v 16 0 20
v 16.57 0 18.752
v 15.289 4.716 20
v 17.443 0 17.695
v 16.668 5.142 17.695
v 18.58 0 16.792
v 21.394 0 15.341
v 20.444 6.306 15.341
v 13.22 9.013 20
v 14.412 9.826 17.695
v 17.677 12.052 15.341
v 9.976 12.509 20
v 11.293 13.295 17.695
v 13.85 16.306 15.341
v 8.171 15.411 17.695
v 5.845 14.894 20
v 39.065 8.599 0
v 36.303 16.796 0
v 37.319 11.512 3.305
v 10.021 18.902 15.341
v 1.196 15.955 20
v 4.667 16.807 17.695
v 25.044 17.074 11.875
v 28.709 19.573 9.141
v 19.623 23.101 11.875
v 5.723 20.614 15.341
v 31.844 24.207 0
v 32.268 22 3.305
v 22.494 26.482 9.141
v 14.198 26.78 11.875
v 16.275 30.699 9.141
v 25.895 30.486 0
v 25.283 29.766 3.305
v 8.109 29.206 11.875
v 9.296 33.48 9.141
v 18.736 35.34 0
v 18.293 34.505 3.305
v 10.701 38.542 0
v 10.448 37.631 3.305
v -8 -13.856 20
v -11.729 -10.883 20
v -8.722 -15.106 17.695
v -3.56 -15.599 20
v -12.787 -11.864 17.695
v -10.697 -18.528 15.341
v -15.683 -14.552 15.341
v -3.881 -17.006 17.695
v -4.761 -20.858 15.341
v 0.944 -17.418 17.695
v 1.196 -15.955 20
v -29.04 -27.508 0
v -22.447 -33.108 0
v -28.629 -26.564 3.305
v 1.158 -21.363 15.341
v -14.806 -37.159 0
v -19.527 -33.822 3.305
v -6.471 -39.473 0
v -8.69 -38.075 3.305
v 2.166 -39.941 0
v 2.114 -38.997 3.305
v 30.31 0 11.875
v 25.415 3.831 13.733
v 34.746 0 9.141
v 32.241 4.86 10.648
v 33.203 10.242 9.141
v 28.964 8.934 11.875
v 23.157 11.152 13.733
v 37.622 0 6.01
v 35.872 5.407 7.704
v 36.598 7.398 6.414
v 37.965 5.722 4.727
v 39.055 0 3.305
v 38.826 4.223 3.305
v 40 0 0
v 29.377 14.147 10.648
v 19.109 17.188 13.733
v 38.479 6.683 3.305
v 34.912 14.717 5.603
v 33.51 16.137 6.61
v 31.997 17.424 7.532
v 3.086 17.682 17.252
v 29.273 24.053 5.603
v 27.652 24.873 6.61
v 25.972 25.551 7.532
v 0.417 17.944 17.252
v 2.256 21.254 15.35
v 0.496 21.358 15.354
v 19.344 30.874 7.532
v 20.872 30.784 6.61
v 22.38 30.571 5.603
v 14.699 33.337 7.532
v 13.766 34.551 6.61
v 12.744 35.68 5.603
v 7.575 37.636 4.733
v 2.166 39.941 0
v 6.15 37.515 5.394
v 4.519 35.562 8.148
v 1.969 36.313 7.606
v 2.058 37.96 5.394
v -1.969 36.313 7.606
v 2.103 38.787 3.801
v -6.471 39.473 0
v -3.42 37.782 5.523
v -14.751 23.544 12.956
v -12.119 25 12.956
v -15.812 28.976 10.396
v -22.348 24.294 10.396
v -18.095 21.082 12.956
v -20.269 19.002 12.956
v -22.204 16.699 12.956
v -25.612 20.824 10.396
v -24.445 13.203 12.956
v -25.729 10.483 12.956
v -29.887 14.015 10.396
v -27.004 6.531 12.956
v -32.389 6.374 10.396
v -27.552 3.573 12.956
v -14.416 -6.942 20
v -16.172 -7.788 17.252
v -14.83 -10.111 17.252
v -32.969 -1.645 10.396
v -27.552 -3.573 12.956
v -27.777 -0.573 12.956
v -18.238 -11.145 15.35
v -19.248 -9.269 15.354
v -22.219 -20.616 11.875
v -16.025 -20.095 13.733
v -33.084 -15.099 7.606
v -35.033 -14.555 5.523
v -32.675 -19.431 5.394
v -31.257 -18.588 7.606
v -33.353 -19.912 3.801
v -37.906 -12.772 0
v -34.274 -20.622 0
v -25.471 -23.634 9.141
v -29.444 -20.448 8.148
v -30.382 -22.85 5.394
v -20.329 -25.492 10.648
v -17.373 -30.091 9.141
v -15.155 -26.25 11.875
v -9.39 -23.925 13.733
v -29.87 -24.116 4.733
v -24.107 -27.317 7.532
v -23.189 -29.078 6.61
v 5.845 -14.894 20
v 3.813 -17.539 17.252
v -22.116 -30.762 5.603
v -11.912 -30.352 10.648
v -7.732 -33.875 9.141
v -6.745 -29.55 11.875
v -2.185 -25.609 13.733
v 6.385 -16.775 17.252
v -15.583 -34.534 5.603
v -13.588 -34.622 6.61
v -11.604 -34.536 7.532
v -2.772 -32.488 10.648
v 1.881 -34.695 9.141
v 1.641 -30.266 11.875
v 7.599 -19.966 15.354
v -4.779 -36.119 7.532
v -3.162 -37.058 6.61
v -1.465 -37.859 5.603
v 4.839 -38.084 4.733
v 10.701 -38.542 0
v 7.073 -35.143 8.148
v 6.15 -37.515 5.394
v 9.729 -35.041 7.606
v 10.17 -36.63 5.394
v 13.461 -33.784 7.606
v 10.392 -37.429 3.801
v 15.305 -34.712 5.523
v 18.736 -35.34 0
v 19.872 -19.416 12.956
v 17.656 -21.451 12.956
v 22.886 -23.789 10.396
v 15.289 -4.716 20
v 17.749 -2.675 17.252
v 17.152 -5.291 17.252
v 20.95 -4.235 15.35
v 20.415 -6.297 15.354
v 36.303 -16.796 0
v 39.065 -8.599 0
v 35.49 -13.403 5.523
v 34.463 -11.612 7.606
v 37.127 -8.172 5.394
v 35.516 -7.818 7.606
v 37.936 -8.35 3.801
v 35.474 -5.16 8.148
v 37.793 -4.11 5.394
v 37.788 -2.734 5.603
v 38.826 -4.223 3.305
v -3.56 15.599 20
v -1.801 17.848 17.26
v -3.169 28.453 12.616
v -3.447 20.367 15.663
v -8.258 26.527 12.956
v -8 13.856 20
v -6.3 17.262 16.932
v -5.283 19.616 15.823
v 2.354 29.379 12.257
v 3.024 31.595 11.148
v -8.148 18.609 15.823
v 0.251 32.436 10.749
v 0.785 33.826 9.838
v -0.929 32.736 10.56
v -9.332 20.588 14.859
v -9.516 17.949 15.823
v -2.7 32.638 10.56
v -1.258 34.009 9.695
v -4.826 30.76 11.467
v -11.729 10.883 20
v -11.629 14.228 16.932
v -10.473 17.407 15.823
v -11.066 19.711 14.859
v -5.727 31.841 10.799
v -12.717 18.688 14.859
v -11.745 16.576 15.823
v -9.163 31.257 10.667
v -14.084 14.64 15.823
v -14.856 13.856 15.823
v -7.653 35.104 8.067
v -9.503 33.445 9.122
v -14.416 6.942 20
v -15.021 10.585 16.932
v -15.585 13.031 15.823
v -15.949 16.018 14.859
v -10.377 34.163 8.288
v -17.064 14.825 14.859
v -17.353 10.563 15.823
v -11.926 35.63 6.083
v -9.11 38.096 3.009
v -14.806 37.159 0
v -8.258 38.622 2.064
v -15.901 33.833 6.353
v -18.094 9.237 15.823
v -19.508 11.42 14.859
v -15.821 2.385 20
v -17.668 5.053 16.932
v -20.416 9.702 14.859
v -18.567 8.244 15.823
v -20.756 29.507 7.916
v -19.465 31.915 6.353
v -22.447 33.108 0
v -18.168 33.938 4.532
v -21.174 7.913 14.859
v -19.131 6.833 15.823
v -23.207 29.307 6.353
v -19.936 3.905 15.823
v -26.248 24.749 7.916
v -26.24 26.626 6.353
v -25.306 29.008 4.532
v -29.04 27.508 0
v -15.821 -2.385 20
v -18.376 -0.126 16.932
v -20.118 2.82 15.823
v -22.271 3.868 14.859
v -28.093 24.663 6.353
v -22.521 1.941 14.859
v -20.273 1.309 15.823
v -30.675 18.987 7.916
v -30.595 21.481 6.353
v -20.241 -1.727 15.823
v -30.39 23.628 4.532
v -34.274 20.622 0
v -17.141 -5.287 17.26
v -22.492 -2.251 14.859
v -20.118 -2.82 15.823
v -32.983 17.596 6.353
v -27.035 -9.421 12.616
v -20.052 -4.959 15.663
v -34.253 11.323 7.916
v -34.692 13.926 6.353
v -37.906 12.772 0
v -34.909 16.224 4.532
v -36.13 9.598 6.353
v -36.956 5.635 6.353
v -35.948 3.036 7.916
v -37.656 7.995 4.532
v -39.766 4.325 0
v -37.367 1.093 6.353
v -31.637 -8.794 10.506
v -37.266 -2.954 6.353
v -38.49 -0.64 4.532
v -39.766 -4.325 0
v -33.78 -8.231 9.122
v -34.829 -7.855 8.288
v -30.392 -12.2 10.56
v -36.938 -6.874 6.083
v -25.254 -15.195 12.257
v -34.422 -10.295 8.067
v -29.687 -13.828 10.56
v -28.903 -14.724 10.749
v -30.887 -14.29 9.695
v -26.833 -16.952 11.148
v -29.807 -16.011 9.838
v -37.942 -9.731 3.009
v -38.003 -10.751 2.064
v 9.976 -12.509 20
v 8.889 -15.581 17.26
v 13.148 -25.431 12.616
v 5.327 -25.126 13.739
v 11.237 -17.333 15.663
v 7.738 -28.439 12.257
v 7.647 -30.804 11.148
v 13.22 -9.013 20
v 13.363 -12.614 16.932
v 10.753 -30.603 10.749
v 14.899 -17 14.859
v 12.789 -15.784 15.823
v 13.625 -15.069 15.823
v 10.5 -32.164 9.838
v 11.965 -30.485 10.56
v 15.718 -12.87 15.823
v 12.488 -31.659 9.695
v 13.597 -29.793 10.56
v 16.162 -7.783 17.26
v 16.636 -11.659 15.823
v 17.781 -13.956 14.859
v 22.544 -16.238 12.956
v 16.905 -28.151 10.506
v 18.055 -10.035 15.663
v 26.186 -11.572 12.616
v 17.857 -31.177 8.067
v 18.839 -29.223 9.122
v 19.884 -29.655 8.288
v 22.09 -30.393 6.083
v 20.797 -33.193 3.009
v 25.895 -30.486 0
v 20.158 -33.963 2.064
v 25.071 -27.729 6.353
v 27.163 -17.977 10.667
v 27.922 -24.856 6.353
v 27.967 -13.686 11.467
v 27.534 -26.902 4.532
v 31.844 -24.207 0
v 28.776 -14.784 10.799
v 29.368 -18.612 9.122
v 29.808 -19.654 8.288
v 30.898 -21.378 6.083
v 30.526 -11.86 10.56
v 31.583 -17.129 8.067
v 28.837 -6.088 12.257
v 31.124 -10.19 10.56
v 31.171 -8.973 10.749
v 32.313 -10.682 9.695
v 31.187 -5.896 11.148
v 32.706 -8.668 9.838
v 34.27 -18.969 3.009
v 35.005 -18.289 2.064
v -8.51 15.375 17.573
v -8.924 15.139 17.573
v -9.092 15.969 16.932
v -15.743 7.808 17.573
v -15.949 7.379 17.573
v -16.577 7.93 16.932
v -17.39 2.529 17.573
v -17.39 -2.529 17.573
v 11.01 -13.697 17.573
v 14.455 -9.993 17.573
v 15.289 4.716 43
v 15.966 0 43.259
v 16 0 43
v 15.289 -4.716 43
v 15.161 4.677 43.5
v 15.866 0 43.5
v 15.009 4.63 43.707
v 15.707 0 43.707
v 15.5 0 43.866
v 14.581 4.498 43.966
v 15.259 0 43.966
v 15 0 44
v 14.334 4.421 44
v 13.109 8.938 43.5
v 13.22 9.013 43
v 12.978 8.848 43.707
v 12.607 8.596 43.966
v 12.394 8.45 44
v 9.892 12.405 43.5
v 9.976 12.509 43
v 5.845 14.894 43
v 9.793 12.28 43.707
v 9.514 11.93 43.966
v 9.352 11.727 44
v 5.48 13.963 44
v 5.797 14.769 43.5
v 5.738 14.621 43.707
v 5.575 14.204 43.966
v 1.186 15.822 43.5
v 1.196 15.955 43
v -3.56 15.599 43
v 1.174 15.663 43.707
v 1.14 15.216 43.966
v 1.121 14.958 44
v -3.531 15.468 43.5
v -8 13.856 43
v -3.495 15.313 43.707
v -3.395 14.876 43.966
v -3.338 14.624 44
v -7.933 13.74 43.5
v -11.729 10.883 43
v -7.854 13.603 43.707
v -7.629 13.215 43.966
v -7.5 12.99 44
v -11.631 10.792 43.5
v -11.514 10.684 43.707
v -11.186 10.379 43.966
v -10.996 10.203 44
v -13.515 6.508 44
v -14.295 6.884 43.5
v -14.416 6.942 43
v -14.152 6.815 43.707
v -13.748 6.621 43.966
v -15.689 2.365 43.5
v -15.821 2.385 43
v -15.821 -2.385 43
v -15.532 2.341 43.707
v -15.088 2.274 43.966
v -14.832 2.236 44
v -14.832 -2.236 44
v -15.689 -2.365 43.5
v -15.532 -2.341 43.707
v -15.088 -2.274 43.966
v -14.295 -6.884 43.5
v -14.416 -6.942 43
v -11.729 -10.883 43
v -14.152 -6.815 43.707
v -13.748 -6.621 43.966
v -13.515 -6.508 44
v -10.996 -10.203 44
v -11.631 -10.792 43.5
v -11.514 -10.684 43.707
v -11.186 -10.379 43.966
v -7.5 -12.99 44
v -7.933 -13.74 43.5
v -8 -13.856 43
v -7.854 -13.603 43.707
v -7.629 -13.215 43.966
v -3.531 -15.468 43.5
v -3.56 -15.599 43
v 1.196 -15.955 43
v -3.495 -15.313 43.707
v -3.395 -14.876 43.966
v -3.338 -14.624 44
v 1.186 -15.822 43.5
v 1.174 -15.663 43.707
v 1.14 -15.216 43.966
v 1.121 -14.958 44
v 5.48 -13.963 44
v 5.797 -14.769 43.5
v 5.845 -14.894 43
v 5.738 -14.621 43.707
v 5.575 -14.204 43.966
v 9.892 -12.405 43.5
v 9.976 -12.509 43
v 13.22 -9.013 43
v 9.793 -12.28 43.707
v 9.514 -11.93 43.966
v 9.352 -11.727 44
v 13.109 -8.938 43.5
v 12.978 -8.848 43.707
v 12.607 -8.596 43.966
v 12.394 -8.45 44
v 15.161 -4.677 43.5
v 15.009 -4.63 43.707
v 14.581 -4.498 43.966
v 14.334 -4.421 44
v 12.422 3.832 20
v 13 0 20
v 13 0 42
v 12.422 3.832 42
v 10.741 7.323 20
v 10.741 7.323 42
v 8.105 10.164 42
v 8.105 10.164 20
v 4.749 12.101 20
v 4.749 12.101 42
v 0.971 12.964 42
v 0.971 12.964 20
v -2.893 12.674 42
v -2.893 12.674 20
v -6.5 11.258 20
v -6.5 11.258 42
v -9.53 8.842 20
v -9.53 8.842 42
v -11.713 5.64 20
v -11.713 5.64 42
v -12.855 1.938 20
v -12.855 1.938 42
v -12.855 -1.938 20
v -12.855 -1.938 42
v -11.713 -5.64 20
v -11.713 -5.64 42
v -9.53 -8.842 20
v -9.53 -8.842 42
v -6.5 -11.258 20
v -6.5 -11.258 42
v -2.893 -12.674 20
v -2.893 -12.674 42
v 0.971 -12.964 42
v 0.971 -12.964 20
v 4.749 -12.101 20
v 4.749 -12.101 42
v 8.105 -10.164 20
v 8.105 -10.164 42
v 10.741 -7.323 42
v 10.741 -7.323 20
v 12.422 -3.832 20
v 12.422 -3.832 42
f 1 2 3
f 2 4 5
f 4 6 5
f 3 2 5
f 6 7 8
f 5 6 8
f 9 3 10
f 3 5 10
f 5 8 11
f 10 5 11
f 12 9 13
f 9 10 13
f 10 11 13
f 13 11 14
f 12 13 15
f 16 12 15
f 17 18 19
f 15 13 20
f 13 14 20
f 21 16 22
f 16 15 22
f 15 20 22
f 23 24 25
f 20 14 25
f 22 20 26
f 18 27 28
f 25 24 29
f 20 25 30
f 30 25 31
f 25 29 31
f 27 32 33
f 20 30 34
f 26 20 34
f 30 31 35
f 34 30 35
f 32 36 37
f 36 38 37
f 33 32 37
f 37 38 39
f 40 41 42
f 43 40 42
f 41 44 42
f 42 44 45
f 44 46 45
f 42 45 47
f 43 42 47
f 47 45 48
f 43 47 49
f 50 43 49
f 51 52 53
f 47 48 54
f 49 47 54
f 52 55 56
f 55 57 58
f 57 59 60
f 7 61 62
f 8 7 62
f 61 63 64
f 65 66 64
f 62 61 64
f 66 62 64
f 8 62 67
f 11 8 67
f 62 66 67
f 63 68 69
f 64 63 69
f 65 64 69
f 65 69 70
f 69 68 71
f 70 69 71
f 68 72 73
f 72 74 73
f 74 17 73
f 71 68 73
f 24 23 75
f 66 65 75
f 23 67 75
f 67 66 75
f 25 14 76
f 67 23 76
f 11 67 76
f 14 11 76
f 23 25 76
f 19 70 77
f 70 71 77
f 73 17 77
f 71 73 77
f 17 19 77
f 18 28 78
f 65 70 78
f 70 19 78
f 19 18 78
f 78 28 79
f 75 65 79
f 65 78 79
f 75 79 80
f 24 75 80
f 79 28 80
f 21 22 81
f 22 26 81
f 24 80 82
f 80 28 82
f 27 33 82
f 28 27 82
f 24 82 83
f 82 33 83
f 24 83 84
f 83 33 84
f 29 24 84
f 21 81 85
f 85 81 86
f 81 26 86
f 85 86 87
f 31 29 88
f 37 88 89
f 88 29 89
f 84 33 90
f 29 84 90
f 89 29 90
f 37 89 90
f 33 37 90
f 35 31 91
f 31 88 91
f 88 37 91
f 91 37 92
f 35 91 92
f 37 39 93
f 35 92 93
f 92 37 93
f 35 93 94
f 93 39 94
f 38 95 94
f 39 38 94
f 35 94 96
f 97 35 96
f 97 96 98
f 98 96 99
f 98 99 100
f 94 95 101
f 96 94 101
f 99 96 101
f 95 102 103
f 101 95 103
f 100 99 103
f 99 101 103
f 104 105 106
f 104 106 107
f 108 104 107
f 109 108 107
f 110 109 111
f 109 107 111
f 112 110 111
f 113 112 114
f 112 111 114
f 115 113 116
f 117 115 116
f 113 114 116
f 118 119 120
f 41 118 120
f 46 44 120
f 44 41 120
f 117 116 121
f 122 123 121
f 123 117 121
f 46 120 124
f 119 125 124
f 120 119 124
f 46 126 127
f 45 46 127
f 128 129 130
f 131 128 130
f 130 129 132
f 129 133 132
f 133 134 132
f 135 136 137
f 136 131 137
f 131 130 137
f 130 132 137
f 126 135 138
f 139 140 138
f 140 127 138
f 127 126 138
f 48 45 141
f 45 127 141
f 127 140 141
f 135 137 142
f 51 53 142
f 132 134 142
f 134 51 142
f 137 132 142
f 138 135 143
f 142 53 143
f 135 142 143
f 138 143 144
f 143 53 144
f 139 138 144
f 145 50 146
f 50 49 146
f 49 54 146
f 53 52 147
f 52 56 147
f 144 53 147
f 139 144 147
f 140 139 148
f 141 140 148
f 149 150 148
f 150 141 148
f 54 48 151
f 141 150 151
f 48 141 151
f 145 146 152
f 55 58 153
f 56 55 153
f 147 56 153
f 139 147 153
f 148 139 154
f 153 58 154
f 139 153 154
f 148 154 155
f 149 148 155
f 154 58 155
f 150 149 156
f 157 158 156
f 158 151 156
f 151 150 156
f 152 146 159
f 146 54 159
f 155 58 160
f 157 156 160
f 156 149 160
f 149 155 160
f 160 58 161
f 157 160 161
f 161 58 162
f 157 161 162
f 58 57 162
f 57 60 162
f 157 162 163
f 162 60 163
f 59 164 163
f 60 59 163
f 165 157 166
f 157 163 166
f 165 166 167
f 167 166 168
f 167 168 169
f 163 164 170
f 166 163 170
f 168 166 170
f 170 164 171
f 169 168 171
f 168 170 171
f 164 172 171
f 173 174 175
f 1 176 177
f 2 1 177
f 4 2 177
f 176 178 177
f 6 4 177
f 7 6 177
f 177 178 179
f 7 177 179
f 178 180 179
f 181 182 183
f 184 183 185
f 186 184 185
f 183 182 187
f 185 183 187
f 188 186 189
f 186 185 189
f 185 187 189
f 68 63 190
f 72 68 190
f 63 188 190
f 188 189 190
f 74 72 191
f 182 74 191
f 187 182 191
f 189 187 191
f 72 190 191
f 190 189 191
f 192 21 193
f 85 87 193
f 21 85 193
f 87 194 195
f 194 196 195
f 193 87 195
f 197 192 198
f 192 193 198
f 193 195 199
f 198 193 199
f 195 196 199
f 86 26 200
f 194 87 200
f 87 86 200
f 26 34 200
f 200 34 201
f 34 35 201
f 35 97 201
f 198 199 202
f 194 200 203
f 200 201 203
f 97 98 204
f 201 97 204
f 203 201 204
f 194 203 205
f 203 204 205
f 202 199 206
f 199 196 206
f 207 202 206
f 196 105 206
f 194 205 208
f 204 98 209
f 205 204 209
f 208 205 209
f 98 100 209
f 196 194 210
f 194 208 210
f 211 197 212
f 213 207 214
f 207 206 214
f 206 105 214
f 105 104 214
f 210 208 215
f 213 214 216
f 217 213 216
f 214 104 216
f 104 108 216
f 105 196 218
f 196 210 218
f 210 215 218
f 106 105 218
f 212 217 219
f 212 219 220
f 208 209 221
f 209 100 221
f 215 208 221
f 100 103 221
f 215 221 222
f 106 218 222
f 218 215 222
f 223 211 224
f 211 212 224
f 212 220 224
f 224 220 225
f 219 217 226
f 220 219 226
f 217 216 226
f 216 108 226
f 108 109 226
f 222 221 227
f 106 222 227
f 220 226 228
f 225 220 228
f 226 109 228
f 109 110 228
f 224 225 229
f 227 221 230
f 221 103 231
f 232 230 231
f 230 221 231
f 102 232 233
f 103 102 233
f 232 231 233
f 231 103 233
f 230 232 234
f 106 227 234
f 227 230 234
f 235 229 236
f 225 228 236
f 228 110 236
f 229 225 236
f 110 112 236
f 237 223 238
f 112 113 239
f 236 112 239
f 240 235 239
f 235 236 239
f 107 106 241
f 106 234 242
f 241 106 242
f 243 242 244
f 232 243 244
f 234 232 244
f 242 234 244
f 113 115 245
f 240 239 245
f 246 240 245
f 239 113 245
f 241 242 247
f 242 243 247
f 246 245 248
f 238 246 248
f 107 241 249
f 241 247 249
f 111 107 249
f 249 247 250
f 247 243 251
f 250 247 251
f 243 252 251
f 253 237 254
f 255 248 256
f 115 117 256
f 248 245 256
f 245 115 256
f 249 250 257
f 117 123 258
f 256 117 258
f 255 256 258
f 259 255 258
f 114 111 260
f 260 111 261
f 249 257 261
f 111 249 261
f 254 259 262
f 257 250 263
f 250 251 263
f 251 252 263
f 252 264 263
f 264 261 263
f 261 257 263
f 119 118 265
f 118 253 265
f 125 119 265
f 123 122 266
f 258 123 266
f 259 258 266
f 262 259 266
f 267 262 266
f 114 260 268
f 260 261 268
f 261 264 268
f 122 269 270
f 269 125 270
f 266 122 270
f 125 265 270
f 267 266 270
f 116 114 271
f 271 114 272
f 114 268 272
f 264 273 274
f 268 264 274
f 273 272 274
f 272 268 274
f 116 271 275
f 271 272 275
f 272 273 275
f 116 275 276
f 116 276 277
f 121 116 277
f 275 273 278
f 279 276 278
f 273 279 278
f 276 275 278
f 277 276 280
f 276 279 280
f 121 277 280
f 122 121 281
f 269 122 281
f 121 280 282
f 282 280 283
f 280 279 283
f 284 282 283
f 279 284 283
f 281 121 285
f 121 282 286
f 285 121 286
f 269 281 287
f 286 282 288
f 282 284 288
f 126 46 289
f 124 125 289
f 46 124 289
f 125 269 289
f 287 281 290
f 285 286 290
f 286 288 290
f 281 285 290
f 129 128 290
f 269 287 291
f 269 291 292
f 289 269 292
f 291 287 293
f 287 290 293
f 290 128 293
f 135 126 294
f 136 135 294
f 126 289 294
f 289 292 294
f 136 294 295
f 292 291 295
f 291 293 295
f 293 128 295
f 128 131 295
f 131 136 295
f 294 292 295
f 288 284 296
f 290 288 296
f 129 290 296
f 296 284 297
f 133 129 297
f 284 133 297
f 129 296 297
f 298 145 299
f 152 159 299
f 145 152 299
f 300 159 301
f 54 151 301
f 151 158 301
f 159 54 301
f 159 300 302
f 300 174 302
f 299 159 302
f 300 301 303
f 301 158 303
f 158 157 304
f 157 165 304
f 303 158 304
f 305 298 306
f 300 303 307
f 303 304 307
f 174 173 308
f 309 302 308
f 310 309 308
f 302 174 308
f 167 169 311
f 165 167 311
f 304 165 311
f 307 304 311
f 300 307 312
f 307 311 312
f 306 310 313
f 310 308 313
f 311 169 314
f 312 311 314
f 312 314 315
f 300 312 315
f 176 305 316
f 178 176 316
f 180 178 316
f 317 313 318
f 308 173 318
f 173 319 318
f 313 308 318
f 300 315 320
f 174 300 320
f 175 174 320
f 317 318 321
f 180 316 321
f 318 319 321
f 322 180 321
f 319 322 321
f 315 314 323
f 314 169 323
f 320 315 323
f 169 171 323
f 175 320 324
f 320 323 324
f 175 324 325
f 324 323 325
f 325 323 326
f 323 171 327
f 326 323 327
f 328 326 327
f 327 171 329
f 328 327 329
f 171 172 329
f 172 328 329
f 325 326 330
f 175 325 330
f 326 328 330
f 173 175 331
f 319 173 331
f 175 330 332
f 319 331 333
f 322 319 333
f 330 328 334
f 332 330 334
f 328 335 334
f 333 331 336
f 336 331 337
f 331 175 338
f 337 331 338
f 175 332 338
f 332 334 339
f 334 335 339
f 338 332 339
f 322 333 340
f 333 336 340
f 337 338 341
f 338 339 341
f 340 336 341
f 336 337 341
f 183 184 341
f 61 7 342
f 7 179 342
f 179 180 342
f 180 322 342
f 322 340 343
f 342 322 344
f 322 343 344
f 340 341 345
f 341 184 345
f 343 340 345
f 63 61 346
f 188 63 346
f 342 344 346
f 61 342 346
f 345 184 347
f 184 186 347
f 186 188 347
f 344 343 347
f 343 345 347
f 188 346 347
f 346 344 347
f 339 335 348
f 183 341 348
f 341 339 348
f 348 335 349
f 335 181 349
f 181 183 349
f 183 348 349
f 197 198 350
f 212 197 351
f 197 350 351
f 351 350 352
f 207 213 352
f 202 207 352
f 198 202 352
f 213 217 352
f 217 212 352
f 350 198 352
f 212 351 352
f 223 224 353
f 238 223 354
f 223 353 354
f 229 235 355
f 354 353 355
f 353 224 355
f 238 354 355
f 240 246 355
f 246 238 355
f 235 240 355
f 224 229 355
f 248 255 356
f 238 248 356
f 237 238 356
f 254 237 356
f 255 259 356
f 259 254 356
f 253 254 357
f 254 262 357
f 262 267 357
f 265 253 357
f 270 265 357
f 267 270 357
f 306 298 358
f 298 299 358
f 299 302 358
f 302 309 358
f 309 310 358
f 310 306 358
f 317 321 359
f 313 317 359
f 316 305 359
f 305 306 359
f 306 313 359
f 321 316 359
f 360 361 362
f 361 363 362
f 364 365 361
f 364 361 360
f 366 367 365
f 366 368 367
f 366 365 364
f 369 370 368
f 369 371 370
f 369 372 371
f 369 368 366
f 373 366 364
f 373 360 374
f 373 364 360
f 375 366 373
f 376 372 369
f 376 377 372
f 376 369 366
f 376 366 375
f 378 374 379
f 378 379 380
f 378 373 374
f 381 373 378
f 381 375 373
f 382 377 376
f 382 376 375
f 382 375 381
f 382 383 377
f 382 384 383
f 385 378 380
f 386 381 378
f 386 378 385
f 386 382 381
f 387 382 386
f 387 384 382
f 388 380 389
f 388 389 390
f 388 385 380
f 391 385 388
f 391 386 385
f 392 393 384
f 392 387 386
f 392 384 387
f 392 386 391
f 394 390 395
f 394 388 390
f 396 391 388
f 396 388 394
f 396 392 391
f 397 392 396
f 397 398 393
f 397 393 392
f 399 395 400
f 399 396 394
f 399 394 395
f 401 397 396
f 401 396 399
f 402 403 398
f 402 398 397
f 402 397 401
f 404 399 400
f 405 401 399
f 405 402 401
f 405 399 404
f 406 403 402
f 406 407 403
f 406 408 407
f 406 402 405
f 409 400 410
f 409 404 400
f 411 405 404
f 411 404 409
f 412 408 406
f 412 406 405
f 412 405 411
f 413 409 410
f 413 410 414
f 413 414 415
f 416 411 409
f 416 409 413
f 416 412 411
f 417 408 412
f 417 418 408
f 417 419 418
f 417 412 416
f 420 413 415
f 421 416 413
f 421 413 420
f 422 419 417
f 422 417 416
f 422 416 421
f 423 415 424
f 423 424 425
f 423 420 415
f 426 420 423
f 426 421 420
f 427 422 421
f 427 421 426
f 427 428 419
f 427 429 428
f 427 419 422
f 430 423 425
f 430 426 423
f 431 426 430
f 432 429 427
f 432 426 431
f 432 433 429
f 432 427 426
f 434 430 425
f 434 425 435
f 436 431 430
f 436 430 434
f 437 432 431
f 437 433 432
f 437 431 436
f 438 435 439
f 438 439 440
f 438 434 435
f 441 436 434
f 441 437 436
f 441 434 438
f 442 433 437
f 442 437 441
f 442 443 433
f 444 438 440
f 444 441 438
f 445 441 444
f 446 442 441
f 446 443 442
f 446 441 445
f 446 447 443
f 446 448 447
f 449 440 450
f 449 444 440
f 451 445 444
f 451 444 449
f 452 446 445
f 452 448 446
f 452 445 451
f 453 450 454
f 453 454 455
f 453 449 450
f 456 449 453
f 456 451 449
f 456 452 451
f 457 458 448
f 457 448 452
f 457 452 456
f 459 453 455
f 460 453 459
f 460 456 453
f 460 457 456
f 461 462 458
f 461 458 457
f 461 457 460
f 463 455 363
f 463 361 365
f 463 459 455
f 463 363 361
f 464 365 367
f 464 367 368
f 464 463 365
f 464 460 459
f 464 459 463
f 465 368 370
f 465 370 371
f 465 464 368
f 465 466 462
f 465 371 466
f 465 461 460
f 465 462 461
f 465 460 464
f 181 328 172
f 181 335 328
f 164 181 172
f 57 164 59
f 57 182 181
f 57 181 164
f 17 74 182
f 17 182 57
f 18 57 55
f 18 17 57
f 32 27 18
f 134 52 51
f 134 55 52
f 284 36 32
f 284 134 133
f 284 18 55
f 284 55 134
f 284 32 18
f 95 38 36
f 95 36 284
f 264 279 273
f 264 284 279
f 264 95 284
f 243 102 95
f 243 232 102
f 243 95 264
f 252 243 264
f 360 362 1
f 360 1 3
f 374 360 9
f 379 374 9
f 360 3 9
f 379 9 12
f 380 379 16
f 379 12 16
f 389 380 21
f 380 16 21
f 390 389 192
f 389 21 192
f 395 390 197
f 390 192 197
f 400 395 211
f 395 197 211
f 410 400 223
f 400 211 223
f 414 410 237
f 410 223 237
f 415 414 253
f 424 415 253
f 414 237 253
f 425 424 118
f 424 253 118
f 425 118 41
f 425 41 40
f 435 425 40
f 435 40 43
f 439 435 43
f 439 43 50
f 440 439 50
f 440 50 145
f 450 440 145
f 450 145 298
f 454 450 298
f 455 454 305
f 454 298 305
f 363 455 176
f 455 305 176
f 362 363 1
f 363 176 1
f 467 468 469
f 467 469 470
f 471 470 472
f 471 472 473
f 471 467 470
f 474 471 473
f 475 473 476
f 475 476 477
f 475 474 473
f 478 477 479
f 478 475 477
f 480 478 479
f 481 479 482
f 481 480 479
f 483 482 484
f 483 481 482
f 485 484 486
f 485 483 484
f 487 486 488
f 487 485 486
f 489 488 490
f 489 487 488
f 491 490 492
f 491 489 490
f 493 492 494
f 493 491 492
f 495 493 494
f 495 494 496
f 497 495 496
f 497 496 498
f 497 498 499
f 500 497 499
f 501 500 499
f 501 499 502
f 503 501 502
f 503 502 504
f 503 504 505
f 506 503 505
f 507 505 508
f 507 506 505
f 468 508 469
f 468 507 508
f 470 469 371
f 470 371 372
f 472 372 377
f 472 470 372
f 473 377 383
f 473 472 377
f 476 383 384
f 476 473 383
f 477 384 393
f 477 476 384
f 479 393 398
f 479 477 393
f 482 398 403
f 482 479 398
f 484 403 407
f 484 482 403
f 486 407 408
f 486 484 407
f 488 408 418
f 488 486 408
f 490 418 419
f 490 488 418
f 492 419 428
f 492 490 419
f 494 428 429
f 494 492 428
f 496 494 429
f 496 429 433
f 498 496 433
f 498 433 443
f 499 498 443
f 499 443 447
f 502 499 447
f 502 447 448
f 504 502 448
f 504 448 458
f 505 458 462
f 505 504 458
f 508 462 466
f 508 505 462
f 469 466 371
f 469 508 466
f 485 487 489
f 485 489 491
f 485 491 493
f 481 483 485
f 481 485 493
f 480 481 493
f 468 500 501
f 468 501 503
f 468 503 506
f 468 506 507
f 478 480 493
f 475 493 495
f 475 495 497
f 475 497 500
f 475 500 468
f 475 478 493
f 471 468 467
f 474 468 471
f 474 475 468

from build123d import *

# Parameters (mm, degrees)
F0_R     = 16
F0_R_2   = 13
F1_DEPTH = 24
F5_R     = 1
F6_SIZE  = 1.99999


# Not quite as in the source:
# - a fillet or chamfer is up to 0.001 mm smaller than in the source, because OpenCascade refuses the exact size


with BuildPart() as f1:
    # F0 (on Top) → F1 (new body)
    with BuildSketch(Plane.XY):
        Circle(F0_R)
        Circle(F0_R_2, mode=Mode.SUBTRACT)
    extrude(amount=F1_DEPTH)


with BuildPart() as f1_1:
    # F2: moved
    add(f1.part.moved(Location((0, 0, 20))))

    # F3 (on Front) → F4 (revolve)
    with BuildSketch(Plane.XZ):
        with BuildLine():
            Line((0, 20), (0, 0))
            Line((0, 0), (40, 0))
            add(Edge.make_bspline(
                [(16, 20), (18.2981714606, 12.3168695718), (37.1231473982, 15.5654279515), (40, 0)],
                knots=[0, 0, 0, 0, 31.2409987036, 31.2409987036, 31.2409987036, 31.2409987036], degree=3))
            Line((16, 20), (0, 20))
        make_face()
    revolve(axis=Axis((0, 0, 10), (0, 0, 1)))

    # F5
    f5_edges = [f1_1.edges().sort_by_distance(p)[0] for p in [
        (-16, 0, 44),
    ]]
    fillet(f5_edges, radius=F5_R)

    # F6 (size 2 in the source; OpenCascade refuses exactly that, so slightly less here)
    f6_edges = [f1_1.edges().sort_by_distance(p)[0] for p in [
        (-13, 0, 44),
    ]]
    chamfer(f6_edges, length=F6_SIZE)


solid = f1_1.part
